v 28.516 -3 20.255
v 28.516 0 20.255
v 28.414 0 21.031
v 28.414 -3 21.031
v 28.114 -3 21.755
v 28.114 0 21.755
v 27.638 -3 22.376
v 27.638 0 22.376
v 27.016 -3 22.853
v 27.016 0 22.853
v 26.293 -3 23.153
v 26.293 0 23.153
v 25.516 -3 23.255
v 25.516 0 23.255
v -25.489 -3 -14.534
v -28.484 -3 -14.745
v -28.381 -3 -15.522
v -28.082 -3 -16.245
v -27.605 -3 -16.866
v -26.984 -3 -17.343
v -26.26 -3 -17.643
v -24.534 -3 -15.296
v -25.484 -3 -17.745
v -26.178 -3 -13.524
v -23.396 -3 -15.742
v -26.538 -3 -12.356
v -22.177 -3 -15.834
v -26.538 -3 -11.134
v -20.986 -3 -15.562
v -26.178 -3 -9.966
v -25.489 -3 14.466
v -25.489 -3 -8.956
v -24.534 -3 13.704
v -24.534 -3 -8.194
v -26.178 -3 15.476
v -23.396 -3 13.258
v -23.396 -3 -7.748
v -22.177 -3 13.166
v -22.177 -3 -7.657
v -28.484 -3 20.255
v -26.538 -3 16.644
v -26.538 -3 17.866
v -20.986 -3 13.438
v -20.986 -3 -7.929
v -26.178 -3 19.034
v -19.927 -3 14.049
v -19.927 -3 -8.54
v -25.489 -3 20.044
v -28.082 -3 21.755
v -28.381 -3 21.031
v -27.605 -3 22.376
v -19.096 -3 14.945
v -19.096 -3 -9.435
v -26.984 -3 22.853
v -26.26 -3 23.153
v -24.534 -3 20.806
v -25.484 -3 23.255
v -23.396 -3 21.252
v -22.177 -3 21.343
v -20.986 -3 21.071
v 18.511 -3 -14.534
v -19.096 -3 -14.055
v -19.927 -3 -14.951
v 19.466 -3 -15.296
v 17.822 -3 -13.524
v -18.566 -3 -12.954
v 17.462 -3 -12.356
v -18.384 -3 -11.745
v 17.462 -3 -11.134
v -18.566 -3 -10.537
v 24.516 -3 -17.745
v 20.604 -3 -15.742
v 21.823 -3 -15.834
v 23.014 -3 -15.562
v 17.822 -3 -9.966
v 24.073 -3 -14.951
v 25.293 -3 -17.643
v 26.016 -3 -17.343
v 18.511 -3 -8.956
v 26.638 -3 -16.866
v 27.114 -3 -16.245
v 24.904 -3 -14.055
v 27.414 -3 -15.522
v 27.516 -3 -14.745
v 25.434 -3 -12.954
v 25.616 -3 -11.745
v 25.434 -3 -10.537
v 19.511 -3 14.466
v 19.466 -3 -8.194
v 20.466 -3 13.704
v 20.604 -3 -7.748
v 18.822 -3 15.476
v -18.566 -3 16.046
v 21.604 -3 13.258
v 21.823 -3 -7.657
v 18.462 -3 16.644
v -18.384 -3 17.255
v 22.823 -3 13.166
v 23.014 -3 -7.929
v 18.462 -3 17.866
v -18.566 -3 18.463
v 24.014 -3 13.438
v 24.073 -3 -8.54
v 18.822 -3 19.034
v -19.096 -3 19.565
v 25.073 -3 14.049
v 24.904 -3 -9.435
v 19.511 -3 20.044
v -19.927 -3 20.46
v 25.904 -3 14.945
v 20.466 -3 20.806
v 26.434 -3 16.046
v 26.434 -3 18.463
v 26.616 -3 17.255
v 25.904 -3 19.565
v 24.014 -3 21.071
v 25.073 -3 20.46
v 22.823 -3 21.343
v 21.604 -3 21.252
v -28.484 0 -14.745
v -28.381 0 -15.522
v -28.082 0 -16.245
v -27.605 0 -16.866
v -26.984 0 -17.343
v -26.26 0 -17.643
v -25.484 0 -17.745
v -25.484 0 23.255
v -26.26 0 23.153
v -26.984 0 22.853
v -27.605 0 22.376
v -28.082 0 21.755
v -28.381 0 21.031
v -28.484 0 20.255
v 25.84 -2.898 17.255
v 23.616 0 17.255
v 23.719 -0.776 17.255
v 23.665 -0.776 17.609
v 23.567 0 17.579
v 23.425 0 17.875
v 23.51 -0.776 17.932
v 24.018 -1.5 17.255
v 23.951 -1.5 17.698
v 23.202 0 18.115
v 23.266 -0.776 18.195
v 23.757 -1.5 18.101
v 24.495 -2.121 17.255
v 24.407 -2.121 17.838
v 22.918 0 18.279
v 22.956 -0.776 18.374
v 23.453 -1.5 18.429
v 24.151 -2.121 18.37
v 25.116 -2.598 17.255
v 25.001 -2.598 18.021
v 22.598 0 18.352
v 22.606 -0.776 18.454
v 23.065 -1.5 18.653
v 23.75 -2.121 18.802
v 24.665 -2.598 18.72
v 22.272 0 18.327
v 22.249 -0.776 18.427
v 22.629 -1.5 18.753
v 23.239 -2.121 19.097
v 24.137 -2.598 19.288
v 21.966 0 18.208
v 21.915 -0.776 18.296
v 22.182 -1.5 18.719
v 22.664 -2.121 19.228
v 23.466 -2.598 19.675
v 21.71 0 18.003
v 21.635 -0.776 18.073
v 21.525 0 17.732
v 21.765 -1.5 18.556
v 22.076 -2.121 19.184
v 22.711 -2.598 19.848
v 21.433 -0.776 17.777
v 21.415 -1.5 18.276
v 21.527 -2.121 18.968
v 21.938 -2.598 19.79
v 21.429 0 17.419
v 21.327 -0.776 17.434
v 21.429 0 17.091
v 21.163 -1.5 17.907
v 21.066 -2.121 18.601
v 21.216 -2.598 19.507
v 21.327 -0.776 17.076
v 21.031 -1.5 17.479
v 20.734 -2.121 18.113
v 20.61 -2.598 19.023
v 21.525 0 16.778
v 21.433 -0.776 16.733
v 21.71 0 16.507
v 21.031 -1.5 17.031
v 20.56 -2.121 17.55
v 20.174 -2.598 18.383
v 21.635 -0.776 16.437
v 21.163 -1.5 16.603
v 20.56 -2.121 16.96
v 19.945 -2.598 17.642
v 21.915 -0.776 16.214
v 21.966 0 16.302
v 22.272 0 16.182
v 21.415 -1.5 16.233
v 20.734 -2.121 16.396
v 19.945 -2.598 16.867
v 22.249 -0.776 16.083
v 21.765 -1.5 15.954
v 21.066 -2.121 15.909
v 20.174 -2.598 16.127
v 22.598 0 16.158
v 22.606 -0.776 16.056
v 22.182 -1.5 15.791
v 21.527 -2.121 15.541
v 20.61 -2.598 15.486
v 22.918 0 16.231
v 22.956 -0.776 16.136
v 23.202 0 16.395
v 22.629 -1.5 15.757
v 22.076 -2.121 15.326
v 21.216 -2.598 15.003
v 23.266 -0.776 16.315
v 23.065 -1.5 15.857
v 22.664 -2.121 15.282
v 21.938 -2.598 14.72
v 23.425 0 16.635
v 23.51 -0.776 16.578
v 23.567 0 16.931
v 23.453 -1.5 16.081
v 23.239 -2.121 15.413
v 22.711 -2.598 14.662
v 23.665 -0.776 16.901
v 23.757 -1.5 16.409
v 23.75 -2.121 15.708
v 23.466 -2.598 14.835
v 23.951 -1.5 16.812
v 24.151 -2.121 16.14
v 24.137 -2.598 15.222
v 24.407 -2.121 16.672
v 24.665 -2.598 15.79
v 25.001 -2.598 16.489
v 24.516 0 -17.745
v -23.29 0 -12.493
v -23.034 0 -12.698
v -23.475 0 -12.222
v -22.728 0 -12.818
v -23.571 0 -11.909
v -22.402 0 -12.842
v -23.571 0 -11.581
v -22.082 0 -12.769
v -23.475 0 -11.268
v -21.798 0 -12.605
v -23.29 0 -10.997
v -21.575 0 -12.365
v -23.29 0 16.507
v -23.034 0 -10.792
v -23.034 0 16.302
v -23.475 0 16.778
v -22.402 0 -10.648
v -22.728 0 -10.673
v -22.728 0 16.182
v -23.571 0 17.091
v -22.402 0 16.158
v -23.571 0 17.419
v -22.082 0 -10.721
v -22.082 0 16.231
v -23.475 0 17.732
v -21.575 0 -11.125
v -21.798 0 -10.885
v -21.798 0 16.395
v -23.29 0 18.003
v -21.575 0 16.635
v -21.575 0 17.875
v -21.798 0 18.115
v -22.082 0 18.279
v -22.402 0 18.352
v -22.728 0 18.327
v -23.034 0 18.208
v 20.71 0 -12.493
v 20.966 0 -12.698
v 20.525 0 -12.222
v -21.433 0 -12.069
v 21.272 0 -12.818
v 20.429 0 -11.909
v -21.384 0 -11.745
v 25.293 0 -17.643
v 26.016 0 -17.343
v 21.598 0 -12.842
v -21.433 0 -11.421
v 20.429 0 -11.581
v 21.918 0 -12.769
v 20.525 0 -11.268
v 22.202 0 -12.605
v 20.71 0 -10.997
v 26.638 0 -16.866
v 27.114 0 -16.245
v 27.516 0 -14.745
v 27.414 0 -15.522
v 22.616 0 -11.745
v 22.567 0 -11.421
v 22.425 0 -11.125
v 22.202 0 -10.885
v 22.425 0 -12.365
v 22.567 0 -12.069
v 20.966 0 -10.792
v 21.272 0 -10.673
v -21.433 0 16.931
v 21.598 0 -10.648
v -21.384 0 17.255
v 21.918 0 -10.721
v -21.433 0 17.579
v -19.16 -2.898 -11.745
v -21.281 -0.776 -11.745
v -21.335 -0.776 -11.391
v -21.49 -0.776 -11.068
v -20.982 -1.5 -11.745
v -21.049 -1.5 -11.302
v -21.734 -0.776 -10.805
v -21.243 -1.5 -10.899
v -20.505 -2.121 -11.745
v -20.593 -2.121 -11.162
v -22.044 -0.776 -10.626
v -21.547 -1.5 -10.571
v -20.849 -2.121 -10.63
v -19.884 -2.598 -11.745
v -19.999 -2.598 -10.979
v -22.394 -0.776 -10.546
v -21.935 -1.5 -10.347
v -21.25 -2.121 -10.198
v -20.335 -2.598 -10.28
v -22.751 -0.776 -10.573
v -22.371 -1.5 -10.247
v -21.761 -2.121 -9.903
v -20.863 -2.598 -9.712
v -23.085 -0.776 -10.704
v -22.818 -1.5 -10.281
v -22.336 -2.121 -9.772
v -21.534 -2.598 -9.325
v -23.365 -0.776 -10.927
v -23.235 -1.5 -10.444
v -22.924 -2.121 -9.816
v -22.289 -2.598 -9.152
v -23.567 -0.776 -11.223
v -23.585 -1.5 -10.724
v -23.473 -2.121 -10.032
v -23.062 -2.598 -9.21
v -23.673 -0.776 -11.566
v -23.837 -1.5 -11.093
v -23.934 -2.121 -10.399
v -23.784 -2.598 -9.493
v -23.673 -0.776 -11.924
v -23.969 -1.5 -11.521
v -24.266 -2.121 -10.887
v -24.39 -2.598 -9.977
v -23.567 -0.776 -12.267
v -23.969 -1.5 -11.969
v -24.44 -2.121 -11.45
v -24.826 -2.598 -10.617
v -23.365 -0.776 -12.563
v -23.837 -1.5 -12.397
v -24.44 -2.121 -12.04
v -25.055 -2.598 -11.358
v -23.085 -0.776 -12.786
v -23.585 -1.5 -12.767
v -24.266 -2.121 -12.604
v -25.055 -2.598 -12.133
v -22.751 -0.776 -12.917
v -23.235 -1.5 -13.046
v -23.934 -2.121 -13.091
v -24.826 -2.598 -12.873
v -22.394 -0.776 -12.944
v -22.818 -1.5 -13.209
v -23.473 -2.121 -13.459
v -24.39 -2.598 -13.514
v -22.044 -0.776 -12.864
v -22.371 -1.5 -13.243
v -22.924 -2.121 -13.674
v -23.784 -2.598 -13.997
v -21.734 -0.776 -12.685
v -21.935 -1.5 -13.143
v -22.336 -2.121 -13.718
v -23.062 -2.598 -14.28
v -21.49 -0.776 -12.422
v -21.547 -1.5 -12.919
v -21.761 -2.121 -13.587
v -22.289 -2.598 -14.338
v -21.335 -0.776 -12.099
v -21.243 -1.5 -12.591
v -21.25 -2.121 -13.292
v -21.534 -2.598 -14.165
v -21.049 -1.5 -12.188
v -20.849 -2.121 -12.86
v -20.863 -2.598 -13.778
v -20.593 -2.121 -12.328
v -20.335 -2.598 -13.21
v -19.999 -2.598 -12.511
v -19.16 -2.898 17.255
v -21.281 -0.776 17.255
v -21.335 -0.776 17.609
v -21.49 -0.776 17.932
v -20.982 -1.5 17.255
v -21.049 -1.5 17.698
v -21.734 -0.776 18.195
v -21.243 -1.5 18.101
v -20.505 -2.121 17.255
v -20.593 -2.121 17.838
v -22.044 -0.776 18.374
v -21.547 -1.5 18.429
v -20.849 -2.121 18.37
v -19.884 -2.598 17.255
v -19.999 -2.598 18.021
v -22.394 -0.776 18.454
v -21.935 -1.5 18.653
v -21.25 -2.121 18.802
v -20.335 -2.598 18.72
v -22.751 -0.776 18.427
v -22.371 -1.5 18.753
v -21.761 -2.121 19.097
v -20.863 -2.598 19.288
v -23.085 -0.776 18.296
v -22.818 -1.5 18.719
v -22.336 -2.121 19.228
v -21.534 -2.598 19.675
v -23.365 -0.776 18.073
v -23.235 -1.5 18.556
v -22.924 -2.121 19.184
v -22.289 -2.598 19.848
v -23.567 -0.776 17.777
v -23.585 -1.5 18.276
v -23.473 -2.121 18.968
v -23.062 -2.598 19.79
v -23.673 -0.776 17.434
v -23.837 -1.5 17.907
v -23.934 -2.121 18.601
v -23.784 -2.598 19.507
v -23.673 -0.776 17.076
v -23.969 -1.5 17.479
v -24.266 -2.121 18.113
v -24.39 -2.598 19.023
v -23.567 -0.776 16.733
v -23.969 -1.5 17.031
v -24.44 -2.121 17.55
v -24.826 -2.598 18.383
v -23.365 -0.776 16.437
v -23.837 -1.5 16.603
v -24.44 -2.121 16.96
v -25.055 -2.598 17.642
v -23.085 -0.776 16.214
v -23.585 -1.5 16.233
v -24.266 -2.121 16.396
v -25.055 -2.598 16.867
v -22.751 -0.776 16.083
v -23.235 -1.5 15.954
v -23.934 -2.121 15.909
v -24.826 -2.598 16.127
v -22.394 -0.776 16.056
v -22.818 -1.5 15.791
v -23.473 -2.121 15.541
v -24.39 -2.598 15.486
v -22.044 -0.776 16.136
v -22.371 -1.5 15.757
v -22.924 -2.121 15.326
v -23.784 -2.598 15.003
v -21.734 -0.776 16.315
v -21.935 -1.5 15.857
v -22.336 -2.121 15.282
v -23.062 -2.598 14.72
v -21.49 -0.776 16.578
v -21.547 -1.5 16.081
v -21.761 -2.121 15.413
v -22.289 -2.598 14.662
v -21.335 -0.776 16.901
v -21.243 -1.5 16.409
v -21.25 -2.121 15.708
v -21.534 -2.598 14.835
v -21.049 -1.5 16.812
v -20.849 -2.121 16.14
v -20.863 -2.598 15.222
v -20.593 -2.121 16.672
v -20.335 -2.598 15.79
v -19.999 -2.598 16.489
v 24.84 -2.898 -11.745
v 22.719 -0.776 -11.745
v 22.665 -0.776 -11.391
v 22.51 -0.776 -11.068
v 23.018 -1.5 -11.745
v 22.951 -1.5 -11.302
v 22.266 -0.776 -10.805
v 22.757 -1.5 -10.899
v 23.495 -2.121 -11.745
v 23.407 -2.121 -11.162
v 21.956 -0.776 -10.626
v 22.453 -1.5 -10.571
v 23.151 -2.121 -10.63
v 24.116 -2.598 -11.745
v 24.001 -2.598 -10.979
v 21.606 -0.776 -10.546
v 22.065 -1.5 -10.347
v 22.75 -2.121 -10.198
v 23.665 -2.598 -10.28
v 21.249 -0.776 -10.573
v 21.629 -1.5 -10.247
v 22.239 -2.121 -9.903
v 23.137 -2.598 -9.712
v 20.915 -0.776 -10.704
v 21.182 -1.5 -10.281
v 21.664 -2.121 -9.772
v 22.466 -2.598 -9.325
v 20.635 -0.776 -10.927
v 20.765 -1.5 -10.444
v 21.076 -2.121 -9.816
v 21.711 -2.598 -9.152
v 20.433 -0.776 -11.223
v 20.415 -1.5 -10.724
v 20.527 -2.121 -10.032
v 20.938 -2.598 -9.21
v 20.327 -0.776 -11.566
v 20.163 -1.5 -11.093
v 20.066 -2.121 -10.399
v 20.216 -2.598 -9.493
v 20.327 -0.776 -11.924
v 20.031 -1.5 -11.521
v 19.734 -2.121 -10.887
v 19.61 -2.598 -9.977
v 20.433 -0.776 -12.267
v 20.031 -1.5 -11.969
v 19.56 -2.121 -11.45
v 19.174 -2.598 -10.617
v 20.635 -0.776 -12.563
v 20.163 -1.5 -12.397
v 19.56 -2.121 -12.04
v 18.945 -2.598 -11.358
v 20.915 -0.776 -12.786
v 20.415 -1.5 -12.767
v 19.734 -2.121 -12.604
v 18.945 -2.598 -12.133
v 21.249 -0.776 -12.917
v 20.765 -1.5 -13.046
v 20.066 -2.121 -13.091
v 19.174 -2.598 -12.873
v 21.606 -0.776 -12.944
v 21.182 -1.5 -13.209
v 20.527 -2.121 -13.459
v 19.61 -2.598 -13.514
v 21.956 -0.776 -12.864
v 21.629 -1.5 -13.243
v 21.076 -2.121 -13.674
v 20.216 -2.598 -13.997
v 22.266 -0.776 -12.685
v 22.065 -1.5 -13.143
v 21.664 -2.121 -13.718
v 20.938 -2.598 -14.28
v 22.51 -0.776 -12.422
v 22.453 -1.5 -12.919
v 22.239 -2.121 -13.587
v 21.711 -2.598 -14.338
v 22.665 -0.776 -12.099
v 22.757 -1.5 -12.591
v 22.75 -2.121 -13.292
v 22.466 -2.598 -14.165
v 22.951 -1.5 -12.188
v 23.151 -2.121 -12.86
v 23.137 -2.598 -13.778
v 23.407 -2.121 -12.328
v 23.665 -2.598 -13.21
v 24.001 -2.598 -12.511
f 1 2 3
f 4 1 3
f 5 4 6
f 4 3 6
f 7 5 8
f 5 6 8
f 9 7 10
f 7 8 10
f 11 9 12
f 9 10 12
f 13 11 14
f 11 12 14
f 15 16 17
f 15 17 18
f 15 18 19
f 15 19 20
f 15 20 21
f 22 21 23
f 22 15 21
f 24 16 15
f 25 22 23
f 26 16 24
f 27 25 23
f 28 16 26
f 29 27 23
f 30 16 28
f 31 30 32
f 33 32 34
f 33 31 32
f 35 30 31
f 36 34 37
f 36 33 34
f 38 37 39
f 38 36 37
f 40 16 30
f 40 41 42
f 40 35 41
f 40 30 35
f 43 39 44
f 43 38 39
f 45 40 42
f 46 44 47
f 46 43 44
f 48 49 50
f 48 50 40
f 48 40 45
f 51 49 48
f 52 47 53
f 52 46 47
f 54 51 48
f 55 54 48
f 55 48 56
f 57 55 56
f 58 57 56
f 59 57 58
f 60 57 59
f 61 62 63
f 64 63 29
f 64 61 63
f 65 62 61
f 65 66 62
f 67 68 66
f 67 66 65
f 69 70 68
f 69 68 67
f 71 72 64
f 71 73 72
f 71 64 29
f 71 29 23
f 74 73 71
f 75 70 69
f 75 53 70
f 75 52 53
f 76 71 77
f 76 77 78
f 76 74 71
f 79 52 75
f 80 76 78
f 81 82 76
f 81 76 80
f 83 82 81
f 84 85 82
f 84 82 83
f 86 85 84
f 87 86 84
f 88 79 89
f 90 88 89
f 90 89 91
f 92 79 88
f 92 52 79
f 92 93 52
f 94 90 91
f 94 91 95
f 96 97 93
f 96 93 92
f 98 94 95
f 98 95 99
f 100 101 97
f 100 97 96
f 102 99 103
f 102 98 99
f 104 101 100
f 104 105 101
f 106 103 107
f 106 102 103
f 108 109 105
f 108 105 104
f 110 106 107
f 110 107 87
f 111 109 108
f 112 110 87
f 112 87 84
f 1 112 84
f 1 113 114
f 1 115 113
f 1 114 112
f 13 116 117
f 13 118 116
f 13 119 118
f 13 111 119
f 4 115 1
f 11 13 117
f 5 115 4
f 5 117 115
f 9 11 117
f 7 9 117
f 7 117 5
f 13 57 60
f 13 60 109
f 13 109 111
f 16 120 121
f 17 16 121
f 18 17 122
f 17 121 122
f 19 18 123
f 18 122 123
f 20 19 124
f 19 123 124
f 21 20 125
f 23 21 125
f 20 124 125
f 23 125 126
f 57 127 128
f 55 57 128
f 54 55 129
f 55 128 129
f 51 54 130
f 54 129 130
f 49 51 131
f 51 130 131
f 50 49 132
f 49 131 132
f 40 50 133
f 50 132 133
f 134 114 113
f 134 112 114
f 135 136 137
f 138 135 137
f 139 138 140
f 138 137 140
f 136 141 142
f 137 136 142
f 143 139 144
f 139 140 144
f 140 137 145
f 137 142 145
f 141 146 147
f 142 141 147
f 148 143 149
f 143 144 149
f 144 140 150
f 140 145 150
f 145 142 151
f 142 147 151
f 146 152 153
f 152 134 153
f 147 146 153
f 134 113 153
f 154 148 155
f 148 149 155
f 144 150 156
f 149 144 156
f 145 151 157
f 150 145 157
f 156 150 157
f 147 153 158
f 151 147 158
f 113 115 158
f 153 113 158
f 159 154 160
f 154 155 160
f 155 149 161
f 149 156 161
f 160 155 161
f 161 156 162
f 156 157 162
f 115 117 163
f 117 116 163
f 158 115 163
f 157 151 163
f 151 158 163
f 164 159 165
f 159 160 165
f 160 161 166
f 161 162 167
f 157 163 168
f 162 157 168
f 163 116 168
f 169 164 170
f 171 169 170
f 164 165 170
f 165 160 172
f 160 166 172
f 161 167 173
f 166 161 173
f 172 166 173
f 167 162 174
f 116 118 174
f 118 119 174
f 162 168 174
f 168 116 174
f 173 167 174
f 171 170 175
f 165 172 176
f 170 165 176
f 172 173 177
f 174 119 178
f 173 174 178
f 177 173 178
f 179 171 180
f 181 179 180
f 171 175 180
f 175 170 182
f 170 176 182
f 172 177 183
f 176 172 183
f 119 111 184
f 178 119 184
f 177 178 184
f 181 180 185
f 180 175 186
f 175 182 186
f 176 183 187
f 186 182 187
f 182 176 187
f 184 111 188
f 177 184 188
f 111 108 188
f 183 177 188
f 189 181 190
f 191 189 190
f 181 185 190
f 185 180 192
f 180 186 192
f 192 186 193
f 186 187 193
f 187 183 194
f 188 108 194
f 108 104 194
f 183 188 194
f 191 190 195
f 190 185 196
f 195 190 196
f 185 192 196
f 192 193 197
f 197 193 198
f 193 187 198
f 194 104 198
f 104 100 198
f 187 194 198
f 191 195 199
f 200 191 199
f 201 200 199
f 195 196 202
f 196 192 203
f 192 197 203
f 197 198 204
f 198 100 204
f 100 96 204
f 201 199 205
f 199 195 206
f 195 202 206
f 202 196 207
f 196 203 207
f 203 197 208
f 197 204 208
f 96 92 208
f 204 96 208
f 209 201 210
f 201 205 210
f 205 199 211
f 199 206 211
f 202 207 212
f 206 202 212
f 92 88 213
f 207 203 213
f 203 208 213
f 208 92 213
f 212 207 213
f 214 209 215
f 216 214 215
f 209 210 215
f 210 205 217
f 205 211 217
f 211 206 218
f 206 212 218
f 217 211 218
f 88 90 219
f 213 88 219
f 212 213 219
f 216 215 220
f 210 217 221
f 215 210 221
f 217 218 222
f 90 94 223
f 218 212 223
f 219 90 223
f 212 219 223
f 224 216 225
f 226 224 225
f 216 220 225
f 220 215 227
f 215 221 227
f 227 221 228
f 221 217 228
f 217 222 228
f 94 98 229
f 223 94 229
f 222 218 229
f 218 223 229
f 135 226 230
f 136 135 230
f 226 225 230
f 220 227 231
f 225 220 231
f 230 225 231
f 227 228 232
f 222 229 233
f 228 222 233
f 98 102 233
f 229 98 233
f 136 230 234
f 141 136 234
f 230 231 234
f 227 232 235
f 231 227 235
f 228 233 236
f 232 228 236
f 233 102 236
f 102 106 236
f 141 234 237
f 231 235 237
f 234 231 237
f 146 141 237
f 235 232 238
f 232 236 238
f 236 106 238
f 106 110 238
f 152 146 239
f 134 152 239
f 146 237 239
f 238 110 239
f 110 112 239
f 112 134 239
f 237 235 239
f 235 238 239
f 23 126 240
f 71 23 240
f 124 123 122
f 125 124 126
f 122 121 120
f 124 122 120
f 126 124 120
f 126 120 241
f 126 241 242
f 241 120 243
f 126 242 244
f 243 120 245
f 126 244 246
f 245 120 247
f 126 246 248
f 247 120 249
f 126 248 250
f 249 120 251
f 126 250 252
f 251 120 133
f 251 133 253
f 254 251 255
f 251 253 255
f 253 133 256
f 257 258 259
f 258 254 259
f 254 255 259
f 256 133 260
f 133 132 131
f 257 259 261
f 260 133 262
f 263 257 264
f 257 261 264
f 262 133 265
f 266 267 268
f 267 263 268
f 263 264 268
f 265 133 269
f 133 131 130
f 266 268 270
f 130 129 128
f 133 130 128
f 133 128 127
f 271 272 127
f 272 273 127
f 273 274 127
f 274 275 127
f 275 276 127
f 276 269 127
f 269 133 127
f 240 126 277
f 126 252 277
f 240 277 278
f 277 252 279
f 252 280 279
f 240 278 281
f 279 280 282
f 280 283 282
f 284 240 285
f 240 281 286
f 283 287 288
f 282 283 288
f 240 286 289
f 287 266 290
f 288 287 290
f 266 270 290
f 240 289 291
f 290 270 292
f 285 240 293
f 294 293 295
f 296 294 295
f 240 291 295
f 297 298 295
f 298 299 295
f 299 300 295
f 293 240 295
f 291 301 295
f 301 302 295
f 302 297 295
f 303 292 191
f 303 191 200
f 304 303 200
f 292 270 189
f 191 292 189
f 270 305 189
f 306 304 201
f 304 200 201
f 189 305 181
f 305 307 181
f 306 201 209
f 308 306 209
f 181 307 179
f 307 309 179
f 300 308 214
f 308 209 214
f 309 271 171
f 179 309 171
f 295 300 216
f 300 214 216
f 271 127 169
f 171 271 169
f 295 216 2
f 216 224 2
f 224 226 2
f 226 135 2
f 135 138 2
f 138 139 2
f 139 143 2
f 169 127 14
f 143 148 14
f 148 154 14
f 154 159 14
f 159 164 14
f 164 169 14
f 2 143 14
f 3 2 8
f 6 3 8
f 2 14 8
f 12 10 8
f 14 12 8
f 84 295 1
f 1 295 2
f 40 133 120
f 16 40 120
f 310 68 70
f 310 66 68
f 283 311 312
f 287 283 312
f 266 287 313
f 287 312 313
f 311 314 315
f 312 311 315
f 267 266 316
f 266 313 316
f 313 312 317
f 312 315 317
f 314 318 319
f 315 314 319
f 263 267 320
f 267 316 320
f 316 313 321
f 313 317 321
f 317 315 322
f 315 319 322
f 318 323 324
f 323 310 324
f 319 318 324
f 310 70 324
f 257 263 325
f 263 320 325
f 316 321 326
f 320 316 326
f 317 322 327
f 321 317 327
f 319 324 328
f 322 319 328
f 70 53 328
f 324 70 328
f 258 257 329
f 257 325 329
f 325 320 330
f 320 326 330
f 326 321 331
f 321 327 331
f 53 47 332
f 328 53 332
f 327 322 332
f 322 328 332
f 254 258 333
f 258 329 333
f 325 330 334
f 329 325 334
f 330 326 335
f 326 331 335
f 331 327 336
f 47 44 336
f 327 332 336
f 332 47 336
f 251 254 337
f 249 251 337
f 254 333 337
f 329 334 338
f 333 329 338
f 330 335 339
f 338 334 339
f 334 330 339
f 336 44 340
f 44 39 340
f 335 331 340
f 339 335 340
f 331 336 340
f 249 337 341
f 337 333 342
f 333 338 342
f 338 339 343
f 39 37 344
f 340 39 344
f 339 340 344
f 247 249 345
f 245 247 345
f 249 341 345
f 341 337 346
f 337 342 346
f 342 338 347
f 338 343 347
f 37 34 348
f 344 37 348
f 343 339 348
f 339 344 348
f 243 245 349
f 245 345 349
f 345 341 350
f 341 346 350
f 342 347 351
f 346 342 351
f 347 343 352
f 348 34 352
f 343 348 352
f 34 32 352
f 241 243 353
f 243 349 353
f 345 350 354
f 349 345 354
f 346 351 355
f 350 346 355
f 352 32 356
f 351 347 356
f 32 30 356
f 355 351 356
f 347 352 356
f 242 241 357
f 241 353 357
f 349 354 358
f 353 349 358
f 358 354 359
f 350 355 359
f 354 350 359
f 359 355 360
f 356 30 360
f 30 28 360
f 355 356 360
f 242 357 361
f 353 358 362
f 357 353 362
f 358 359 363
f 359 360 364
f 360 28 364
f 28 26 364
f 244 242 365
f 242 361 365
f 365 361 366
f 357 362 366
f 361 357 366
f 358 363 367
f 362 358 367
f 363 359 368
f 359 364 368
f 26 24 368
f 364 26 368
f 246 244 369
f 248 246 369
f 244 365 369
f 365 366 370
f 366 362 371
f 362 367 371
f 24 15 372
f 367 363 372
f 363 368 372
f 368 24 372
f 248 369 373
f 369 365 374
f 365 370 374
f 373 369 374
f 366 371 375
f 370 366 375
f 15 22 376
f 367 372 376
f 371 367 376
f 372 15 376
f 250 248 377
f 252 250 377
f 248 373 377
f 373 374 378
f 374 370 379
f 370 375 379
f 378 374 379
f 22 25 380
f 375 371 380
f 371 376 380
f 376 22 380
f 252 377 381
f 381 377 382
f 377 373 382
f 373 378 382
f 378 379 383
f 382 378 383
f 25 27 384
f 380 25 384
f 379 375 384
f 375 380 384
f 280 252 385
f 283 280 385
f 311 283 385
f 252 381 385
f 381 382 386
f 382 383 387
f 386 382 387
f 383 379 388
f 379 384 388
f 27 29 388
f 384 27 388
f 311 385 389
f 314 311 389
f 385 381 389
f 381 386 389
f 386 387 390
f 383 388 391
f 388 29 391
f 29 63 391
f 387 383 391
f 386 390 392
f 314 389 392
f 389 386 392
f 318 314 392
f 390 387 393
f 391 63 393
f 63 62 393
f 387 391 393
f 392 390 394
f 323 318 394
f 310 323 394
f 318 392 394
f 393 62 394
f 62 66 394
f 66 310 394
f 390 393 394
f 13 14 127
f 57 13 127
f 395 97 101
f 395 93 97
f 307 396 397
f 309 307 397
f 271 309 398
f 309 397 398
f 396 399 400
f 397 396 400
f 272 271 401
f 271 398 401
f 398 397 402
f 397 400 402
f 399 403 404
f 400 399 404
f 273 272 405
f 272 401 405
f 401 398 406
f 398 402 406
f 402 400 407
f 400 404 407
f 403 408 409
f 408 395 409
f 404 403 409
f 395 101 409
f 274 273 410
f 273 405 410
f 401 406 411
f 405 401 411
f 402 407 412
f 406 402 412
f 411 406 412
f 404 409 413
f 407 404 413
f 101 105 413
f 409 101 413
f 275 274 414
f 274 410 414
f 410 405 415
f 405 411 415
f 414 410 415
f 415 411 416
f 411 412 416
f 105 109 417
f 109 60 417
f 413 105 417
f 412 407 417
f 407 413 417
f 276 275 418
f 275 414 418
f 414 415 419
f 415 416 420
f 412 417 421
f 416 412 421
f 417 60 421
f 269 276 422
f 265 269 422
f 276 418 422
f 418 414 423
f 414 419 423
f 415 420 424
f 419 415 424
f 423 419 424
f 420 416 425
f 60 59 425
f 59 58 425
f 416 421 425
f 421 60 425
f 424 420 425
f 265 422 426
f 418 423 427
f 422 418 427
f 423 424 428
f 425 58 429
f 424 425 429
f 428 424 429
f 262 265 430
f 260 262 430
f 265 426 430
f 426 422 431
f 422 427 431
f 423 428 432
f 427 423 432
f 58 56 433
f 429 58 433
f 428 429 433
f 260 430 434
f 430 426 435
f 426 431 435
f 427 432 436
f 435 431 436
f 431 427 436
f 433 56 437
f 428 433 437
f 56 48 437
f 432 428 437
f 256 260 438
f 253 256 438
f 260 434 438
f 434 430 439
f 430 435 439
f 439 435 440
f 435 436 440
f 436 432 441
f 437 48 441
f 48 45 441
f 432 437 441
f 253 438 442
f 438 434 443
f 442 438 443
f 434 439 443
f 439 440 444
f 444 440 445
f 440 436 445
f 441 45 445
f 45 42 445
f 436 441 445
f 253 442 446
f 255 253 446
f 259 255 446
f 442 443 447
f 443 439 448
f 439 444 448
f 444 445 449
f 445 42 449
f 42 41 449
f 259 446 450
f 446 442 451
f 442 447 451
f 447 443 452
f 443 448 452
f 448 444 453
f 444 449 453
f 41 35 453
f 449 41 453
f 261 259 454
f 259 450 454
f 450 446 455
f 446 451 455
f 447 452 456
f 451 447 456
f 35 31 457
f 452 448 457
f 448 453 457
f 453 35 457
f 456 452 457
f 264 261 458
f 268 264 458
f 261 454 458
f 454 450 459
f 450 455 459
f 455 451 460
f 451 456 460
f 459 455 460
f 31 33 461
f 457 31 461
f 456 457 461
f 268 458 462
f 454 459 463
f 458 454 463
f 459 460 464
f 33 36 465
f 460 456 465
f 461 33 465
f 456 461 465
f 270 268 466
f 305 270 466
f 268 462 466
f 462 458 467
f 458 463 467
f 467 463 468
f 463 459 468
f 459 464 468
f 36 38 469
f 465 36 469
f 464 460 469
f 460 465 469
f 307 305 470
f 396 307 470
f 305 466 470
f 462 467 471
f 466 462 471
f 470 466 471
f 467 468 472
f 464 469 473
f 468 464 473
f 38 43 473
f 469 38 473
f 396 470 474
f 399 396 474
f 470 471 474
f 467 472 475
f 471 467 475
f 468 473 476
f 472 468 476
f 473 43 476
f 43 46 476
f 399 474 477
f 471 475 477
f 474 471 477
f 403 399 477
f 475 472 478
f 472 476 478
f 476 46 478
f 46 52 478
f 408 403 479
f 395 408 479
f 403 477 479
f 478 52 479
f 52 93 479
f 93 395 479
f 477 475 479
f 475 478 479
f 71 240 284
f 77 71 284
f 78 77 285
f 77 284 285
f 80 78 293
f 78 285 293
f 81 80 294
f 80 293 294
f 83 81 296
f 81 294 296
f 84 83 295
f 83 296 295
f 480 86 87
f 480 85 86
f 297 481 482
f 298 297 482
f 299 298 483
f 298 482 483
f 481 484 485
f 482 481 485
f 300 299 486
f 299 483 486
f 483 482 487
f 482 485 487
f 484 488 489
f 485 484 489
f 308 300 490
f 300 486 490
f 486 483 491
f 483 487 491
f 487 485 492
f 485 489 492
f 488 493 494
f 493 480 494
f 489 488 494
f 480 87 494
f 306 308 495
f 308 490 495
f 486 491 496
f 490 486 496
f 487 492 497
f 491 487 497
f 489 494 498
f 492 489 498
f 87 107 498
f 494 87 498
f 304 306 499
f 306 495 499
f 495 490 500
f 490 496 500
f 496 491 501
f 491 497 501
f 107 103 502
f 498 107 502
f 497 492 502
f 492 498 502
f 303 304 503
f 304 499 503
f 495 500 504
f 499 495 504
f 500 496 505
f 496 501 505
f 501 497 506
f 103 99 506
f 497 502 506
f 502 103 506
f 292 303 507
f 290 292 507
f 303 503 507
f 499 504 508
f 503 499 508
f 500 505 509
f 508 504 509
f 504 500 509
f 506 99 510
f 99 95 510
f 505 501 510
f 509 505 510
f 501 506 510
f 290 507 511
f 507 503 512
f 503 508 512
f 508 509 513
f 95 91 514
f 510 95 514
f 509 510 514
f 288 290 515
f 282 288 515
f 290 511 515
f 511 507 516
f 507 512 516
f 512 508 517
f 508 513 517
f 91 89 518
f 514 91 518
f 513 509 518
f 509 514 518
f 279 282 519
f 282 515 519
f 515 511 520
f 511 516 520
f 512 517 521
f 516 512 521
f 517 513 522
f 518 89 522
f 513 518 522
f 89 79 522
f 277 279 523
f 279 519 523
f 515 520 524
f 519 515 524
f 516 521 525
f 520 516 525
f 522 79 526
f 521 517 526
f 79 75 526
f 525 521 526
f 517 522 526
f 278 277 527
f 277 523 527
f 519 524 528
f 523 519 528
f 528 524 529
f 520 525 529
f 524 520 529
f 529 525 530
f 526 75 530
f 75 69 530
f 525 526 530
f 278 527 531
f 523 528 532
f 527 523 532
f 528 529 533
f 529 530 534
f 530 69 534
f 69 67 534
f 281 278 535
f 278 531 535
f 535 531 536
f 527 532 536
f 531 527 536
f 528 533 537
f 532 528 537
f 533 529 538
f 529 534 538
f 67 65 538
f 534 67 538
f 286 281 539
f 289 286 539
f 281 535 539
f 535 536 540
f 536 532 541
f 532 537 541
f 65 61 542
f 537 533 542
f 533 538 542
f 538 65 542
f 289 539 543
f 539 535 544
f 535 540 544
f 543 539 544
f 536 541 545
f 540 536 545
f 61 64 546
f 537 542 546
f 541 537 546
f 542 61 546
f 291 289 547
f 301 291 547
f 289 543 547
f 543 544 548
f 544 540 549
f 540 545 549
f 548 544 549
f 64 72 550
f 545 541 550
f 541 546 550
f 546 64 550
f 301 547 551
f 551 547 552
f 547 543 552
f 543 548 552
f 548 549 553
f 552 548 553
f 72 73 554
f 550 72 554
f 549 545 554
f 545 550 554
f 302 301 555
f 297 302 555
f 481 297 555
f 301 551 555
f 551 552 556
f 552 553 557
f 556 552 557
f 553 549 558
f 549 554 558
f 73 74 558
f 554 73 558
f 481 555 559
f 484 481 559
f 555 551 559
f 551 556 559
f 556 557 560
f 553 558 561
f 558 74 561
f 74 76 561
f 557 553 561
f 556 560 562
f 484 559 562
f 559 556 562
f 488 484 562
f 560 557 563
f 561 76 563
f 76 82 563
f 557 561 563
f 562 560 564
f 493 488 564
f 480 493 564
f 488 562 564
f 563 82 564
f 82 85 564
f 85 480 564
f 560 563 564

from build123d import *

# Parameters (mm, degrees)
F0_W     = 3.689654345
F0_H     = 2
F0_W_2   = 6
F0_H_2   = 6
F0_R     = 1.1
F0_W_3   = 3.6920479782
F0_W_4   = 3.5541171093
F1_DEPTH = 3
F2_R     = 2.99999


# Not quite as in the source:
# - a fillet or chamfer is up to 0.001 mm smaller than in the source, because OpenCascade refuses the exact size


with BuildPart() as f1:
    # F0 (on Front) → F1 (new body)
    with BuildSketch(Plane.XZ):
        with BuildLine():
            Line((25.5162836348, 23.2549019608), (-25.4837163652, 23.2549019608))
            ThreePointArc((-25.4837163652, 23.2549019608), (-27.6050367088, 22.3762223043), (-28.4837163652, 20.2549019608))
            Line((-28.4837163652, 20.2549019608), (-28.4837163652, -14.7450980392))
            ThreePointArc((-28.4837163652, -14.7450980392), (-27.6050367088, -16.8664183828), (-25.4837163652, -17.7450980392))
            Line((-25.4837163652, -17.7450980392), (24.5162836348, -17.7450980392))
            ThreePointArc((24.5162836348, -17.7450980392), (26.6376039783, -16.8664183828), (27.5162836348, -14.7450980392))
            Line((27.5162836348, -14.7450980392), (28.5162836348, 20.2549019608))
            ThreePointArc((28.5162836348, 20.2549019608), (27.6376039783, 22.3762223043), (25.5162836348, 23.2549019608))
        make_face()
        Polygon((-25.4837163652, -8.7450980392), (-25.4837163652, -6.7450980392), (-25.4837163652, -4.7450980392), (-25.4837163652, -2.7450980392), (-25.4837163652, -0.7450980392), (-25.4837163652, 14.2549019608), (-25.4837163652, 20.2549019608), (-19.4837163652, 20.2549019608), (19.5162836348, 20.2549019608), (25.5162836348, 20.2549019608), (25.5162836348, 14.2549019608), (25.5162836348, -14.7450980392), (24.5162836348, -14.7450980392), (18.5162836348, -14.7450980392), (-19.4837163652, -14.7450980392), (-25.4837163652, -14.7450980392), align=None, mode=Mode.SUBTRACT)
        Polygon((-21.929599256, -6.7450980392), (-25.4837163652, -6.7450980392), (-25.4837163652, -8.7450980392), (-19.4837163652, -8.7450980392), (-19.4837163652, -14.7450980392), (18.5162836348, -14.7450980392), (18.5162836348, -8.7450980392), (24.5162836348, -8.7450980392), (24.5162836348, -14.7450980392), (25.5162836348, -14.7450980392), (25.5162836348, 14.2549019608), (19.5162836348, 14.2549019608), (19.5162836348, 20.2549019608), (-19.4837163652, 20.2549019608), (-19.4837163652, 14.2549019608), (-25.4837163652, 14.2549019608), (-25.4837163652, -0.7450980392), (-21.791668387, -0.7450980392), (-21.791668387, -2.7450980392), (-25.4837163652, -2.7450980392), (-25.4837163652, -4.7450980392), (-21.929599256, -4.7450980392), align=None)
        with Locations((22.6714564623, -1.7450980392)):
            Rectangle(F0_W, F0_H, mode=Mode.SUBTRACT)
        with Locations((22.5162836348, 17.2549019608)):
            Rectangle(F0_W_2, F0_H_2)
        with Locations((22.5162836348, 17.2549019608)):
            Circle(F0_R, mode=Mode.SUBTRACT)
        with Locations((-22.4837163652, 17.2549019608)):
            Rectangle(F0_W_2, F0_H_2)
        with Locations((-22.4837163652, 17.2549019608)):
            Circle(F0_R, mode=Mode.SUBTRACT)
        with Locations((-22.4837163652, -11.7450980392)):
            Rectangle(F0_W_2, F0_H_2)
        with Locations((-22.4837163652, -11.7450980392)):
            Circle(F0_R, mode=Mode.SUBTRACT)
        with Locations((21.5162836348, -11.7450980392)):
            Rectangle(F0_W_2, F0_H_2)
        with Locations((21.5162836348, -11.7450980392)):
            Circle(F0_R, mode=Mode.SUBTRACT)
        with Locations((-23.6376923761, -1.7450980392)):
            Rectangle(F0_W_3, F0_H)
        with Locations((22.6714564623, -1.7450980392)):
            Rectangle(F0_W, F0_H)
        with Locations((-23.7066578106, -5.7450980392)):
            Rectangle(F0_W_4, F0_H)
    extrude(amount=F1_DEPTH)

    # F2 (radius 3 in the source; OpenCascade refuses exactly that, so slightly less here)
    f2_edges = [f1.edges().sort_by_distance(p)[0] for p in [
        (-23.583716, -3, -11.745098),
        (-23.583716, -3, 17.254902),
        (21.416284, -3, 17.254902),
        (20.416284, -3, -11.745098),
    ]]
    fillet(f2_edges, radius=F2_R)


solid = f1.part
